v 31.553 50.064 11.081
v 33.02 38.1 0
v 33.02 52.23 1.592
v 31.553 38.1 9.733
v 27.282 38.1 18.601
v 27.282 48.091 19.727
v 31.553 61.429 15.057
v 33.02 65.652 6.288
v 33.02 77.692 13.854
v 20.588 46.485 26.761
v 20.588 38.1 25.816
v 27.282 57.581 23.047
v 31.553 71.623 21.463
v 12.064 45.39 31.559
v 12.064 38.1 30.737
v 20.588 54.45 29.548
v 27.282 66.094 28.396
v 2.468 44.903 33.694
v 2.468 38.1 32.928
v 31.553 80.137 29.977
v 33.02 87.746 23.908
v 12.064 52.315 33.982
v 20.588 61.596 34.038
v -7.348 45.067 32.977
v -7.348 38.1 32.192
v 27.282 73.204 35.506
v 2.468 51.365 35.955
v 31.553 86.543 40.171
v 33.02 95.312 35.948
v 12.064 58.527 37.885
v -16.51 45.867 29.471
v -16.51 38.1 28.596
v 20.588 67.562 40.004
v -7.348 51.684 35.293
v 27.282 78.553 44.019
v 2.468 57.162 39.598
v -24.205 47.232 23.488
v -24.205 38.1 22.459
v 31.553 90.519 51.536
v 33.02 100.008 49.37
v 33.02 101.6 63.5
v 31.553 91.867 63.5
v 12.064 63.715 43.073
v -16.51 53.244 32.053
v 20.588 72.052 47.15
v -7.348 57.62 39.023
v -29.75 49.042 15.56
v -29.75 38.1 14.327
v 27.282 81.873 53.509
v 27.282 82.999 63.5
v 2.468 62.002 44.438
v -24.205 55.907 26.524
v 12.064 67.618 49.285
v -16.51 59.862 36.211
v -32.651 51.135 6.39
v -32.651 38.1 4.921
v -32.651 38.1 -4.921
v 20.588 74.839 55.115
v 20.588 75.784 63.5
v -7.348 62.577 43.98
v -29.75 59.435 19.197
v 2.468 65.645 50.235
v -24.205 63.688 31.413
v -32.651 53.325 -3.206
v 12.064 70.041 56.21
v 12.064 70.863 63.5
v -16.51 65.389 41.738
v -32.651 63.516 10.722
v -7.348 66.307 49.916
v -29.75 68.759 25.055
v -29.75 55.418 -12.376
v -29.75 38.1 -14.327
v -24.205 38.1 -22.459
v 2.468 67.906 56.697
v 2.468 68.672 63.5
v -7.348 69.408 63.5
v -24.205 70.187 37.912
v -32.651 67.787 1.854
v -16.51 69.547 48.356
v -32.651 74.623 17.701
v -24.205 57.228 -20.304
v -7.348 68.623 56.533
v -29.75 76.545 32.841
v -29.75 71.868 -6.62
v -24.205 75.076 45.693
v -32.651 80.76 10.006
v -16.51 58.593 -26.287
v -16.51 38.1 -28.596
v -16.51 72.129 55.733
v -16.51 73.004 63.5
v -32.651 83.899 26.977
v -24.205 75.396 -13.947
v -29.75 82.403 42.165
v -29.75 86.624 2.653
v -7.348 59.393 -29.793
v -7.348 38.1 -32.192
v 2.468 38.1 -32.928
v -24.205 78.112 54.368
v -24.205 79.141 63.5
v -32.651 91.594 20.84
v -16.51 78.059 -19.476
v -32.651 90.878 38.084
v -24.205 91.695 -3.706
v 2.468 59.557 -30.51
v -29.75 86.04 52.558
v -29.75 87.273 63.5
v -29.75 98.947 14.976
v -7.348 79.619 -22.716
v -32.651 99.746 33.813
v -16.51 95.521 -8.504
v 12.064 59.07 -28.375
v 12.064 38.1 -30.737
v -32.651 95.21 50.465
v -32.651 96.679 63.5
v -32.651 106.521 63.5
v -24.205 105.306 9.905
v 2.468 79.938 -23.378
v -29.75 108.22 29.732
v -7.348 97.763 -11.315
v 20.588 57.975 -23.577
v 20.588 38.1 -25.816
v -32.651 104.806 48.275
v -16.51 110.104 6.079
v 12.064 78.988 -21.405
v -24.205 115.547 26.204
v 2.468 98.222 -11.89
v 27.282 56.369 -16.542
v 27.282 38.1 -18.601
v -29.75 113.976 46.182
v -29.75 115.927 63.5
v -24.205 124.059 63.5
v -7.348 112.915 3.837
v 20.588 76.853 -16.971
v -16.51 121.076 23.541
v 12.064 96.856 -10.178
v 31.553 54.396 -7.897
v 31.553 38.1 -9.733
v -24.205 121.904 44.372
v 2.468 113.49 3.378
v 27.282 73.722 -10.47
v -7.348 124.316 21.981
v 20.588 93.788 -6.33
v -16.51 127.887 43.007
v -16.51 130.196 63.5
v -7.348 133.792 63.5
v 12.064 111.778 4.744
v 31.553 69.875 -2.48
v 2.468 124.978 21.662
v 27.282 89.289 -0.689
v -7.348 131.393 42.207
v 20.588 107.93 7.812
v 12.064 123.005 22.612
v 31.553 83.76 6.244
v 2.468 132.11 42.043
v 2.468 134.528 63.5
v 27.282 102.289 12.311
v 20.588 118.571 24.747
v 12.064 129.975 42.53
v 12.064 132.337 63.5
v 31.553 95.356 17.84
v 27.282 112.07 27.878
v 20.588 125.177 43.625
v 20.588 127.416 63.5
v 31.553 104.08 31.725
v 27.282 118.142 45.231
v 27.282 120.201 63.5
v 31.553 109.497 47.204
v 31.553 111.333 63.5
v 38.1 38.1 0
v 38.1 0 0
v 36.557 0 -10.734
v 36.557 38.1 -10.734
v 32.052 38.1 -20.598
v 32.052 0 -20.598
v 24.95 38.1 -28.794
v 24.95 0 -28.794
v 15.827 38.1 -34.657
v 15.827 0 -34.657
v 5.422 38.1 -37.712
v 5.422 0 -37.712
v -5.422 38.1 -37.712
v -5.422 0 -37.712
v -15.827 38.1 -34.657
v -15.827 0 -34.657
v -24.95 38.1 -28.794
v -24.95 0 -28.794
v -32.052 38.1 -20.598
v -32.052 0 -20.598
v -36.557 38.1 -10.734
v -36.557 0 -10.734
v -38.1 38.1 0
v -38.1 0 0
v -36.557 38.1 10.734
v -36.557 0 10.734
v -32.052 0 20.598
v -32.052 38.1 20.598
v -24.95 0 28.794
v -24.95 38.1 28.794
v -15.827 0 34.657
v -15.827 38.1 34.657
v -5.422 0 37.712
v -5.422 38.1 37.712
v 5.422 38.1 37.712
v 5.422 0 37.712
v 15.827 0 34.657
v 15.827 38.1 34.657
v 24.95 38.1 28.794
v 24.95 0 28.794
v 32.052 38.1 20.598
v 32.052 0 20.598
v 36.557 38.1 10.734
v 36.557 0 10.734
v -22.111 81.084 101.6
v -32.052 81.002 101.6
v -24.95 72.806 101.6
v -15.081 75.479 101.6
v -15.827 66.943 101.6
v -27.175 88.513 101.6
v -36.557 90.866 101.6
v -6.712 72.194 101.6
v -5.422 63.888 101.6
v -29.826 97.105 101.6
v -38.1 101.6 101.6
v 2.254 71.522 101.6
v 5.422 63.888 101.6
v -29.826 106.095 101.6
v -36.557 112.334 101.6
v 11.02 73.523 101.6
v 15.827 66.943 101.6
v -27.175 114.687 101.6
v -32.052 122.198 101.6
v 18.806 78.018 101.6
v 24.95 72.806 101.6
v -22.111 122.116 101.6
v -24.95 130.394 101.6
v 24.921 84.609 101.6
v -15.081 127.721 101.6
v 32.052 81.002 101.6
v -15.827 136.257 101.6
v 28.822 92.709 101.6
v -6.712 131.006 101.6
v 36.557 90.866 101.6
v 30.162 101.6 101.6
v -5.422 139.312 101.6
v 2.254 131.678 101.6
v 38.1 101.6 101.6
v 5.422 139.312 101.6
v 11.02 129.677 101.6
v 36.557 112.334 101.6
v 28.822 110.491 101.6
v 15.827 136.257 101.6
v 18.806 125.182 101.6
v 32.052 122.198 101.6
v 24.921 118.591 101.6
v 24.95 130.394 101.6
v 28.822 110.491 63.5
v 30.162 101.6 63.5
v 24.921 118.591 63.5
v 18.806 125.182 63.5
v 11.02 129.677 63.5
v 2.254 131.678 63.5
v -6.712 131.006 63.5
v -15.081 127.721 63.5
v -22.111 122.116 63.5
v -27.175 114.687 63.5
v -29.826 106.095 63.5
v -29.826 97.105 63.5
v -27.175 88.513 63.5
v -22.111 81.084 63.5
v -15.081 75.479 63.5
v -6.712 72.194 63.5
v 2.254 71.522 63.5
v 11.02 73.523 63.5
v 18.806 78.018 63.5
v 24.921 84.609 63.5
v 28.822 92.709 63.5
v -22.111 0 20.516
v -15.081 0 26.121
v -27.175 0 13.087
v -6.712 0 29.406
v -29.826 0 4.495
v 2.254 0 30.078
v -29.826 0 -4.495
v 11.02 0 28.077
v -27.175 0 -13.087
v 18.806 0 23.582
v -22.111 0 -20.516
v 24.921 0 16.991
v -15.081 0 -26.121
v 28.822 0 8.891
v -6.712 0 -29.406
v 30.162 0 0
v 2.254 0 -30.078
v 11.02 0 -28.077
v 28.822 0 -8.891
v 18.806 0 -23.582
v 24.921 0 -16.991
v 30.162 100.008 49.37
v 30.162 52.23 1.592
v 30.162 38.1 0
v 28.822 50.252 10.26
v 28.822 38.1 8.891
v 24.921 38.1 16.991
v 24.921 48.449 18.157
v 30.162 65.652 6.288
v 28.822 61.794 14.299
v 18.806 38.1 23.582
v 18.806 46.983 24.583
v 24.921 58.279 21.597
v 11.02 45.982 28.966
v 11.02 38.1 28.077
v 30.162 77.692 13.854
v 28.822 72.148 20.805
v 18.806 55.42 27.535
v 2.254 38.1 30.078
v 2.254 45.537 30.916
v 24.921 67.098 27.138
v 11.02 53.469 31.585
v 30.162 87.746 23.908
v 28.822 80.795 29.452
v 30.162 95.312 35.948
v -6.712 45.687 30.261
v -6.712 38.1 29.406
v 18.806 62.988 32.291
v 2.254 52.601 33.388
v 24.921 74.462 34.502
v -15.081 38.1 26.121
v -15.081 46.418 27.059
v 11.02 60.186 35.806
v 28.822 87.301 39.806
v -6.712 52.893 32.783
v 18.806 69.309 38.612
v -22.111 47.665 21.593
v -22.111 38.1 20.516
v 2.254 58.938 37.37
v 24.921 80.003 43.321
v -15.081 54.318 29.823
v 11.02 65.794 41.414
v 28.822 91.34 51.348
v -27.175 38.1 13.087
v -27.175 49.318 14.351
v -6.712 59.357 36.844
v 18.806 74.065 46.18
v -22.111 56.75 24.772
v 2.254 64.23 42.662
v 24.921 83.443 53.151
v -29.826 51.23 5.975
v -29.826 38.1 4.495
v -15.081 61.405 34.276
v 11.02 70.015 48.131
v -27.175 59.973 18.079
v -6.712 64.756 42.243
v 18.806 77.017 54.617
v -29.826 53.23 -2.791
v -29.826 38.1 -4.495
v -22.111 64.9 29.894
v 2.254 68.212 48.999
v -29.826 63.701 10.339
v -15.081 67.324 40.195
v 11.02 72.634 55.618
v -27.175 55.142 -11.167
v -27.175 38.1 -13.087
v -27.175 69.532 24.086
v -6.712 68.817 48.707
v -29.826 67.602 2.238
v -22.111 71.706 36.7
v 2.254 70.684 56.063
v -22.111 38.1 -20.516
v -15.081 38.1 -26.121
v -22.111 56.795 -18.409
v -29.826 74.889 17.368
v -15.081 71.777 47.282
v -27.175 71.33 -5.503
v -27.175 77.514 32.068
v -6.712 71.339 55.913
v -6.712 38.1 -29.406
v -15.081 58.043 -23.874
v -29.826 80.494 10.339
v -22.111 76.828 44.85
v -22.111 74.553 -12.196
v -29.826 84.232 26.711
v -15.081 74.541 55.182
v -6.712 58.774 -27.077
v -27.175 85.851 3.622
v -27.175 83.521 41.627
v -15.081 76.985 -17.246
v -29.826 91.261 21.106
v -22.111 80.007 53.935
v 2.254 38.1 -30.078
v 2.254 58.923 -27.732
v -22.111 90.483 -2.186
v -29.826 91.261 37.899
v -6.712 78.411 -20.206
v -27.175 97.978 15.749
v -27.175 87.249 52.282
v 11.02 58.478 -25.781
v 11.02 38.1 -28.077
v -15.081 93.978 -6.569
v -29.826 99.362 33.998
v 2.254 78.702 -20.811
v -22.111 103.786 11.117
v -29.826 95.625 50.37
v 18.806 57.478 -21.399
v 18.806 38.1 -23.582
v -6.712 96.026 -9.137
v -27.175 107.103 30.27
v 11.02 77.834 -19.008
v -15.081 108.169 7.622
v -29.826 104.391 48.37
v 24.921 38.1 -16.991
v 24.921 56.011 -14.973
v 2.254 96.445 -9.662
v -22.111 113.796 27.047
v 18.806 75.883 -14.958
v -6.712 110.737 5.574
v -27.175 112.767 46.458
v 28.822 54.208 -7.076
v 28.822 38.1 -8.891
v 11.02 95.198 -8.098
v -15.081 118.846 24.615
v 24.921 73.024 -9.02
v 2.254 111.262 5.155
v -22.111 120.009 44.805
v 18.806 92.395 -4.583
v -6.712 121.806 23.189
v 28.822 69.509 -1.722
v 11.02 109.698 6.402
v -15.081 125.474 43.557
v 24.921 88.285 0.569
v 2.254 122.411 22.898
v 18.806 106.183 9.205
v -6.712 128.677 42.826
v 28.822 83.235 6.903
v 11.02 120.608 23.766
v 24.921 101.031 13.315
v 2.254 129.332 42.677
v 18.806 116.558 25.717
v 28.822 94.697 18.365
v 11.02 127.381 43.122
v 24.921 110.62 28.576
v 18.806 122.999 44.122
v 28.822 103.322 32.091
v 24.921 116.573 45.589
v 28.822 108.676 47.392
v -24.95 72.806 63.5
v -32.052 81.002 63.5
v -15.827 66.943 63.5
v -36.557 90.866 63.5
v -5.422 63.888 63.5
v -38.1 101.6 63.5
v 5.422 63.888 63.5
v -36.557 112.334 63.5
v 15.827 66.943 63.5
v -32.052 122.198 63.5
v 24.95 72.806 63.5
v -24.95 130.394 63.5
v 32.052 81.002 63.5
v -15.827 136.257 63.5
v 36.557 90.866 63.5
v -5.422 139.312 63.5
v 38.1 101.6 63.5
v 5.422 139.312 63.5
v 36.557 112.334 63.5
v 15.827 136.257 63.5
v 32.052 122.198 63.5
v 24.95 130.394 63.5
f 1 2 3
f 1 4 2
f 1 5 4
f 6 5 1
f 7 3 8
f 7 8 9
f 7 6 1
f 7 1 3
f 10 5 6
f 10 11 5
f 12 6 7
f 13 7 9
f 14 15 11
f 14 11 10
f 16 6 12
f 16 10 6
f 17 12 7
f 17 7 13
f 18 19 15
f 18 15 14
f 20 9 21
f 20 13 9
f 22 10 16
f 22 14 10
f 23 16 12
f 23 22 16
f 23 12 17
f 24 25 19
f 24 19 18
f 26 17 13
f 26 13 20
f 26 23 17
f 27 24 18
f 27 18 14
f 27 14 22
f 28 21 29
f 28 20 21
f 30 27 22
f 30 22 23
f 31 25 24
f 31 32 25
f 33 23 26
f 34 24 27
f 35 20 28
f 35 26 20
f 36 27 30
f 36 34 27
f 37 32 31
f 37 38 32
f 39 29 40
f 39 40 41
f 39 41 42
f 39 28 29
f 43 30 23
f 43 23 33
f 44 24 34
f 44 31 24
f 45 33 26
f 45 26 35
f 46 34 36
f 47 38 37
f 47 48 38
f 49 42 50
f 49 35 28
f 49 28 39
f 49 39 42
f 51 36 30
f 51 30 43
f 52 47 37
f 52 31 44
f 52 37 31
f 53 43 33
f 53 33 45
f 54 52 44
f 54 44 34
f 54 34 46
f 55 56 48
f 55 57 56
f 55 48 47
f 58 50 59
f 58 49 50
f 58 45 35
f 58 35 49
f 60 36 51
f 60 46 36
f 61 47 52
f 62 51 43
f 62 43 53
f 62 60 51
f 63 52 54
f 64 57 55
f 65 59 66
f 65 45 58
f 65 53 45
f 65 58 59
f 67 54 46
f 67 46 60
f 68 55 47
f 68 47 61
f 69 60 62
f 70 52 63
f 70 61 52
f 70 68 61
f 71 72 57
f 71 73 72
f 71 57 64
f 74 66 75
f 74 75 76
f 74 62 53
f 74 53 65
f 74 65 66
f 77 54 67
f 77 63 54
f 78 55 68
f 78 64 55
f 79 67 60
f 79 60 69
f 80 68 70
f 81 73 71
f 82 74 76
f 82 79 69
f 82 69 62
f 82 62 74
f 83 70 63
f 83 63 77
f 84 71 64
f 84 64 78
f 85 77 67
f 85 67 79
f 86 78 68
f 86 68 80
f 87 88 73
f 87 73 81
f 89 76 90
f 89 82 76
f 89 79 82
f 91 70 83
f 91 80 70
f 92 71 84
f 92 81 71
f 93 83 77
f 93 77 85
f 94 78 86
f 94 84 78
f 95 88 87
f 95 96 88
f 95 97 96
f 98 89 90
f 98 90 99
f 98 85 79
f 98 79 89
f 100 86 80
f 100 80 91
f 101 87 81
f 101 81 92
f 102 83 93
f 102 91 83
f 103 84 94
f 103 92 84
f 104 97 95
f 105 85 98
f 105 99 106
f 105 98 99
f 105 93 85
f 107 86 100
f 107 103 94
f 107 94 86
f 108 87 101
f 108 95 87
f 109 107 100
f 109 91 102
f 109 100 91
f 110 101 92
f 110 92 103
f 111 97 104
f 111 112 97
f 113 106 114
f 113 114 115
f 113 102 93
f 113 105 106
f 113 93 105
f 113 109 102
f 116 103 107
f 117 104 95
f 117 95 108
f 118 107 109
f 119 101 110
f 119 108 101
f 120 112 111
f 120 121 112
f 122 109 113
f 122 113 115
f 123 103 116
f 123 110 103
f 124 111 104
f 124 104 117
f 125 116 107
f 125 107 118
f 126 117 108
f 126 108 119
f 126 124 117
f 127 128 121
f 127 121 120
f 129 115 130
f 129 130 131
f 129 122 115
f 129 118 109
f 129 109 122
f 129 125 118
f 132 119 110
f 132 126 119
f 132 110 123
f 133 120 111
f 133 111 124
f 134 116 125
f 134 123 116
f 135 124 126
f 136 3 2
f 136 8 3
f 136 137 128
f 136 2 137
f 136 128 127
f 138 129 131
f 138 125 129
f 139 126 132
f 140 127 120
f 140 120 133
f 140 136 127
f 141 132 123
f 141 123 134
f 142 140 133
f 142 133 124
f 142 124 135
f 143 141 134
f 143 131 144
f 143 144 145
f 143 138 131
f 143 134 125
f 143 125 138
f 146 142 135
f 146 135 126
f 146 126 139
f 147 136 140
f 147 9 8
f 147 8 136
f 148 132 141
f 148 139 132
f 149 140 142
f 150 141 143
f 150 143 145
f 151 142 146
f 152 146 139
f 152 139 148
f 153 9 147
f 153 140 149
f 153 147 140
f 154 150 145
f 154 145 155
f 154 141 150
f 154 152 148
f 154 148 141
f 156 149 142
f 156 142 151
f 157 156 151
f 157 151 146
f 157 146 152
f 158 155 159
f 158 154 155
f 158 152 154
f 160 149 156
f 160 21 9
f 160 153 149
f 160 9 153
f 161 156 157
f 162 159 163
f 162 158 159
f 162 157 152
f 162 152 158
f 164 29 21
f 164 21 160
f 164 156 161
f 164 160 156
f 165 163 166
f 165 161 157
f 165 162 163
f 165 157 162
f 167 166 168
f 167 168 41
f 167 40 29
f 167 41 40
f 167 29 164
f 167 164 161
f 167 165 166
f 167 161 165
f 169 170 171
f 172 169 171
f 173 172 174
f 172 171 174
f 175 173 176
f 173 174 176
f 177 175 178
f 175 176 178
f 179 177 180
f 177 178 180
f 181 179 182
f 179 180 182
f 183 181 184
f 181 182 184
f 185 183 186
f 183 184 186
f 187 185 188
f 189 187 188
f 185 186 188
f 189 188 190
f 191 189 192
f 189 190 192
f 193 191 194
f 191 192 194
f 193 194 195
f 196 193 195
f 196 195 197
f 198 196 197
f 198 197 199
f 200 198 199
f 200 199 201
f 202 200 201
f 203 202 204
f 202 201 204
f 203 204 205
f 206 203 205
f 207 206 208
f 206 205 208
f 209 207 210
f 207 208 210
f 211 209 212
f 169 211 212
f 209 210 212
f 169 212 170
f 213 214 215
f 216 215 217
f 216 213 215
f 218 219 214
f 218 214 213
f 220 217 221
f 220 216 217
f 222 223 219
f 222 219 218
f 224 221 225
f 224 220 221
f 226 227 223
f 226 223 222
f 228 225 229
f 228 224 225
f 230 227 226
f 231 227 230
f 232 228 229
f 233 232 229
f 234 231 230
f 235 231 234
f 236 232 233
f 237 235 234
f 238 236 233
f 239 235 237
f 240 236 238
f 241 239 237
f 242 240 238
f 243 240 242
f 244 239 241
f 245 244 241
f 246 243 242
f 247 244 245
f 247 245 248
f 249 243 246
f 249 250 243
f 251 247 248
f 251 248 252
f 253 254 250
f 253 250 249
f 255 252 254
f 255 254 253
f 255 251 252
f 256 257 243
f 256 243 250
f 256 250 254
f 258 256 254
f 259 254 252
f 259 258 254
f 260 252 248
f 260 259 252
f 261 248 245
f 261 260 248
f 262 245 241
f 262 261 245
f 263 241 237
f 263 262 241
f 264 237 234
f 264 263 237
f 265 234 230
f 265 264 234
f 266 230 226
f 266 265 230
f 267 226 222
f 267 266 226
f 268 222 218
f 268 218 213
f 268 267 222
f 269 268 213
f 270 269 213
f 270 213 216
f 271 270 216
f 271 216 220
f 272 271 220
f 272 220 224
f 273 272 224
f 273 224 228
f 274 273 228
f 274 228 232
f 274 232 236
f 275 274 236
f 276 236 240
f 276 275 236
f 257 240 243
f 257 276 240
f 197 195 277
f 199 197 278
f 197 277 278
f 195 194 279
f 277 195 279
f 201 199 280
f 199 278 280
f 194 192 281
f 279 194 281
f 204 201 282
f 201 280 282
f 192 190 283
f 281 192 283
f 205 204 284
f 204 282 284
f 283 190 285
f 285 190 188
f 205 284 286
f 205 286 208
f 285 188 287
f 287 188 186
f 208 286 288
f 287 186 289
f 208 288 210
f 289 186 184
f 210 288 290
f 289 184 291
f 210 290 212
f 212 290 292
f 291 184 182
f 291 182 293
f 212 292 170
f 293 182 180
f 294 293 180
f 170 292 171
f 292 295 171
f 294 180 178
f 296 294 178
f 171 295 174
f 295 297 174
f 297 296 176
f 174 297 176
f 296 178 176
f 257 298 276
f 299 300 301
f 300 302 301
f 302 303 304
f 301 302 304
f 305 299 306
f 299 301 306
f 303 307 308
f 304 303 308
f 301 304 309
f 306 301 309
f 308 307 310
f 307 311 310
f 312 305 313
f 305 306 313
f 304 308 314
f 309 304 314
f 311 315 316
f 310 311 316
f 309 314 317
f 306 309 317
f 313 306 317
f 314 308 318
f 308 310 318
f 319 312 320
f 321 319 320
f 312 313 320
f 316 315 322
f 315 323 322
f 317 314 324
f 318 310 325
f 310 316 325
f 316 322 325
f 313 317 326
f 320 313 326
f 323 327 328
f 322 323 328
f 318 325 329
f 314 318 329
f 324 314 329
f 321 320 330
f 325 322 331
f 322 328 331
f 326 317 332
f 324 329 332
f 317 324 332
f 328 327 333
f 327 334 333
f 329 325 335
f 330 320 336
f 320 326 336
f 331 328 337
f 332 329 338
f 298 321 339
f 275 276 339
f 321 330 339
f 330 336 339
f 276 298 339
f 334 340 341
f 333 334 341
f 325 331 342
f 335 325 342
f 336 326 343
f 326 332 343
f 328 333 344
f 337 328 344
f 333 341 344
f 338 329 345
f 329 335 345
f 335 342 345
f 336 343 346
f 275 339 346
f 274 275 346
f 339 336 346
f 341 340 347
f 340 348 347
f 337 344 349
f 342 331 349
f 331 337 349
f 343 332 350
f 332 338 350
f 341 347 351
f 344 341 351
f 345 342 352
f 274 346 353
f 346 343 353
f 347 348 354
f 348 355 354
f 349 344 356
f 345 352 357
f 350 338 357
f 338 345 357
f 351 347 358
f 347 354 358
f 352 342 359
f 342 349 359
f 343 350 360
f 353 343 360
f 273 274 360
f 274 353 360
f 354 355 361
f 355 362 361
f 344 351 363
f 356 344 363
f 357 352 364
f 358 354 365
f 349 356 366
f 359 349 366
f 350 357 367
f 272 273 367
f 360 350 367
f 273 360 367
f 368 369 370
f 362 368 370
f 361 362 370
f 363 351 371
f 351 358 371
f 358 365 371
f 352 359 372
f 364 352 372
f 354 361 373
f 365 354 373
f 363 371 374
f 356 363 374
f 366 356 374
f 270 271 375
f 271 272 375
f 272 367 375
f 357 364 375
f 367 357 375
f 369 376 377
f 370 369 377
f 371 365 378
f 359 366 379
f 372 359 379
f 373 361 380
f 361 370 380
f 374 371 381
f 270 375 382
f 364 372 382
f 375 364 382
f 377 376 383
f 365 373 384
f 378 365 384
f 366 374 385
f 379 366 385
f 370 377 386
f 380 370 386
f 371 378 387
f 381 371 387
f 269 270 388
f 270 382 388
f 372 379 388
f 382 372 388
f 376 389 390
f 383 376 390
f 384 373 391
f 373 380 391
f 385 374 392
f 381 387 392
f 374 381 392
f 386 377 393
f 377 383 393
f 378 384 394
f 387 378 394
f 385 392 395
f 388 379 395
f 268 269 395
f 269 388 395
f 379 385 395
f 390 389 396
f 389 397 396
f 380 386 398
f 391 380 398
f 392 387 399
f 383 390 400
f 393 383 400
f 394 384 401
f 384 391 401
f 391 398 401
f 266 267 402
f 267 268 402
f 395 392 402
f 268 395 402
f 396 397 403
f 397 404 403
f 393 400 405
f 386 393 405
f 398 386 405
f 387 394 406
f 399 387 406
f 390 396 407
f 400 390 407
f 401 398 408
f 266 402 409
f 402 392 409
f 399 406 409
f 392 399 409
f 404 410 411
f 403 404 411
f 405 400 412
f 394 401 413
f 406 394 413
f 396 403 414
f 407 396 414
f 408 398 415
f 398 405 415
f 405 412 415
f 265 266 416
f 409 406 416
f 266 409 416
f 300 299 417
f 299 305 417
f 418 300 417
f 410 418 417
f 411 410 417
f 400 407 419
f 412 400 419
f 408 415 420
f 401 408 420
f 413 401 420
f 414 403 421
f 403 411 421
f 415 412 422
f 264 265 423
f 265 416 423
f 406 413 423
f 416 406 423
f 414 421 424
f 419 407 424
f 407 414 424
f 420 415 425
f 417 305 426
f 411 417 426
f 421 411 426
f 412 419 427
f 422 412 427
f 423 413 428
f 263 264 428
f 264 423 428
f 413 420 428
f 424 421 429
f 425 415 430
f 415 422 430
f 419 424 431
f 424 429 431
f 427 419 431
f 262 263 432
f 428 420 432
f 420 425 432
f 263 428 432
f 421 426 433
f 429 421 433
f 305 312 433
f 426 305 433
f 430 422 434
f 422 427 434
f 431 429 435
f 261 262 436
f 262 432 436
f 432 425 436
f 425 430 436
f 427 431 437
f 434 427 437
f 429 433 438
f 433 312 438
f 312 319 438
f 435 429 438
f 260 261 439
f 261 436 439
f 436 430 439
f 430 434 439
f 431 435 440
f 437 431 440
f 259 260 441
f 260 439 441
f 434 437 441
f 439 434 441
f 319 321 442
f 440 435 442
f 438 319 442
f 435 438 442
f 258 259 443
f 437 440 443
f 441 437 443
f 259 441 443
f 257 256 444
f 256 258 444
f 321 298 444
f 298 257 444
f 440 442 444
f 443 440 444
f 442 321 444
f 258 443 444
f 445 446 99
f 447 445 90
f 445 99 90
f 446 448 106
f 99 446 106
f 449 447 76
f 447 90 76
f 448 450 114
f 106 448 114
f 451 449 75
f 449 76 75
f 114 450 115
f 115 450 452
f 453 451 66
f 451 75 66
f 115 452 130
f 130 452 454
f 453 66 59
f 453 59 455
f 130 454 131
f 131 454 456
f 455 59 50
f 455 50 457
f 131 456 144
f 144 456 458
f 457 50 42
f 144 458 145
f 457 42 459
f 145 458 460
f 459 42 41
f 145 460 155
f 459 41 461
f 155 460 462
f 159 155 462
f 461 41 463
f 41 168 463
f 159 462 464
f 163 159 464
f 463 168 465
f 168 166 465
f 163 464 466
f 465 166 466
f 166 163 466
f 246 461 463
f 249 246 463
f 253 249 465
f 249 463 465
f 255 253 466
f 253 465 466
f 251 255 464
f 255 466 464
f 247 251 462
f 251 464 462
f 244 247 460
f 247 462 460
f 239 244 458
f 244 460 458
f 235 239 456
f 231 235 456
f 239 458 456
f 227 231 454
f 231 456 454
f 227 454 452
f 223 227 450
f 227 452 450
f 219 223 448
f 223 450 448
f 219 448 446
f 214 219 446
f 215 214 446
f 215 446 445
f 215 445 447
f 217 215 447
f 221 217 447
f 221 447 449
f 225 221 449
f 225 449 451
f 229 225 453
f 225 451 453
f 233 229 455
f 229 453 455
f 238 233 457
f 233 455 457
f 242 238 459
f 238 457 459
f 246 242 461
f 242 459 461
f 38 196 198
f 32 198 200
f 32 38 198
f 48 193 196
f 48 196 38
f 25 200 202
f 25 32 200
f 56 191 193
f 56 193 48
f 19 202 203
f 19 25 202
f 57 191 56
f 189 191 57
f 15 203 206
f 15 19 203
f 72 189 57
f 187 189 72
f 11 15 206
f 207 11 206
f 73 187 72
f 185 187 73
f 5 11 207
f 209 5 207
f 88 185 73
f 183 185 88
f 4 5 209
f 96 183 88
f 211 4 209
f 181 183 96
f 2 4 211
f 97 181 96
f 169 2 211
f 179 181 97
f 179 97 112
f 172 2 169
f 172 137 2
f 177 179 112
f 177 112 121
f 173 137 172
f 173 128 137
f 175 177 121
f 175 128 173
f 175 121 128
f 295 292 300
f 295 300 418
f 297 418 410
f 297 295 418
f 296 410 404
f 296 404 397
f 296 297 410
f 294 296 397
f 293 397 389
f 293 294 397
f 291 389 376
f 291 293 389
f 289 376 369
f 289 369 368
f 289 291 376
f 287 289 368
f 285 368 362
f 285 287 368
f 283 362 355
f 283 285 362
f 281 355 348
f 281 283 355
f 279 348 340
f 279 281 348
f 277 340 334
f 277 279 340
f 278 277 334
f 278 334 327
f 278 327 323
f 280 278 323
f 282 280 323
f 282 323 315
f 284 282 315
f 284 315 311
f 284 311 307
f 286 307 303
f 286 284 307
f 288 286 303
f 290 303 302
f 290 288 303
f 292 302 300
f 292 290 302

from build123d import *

# Parameters (mm, degrees)
SKETCH1_R           = 38.1
SKETCH1_R_2         = 30.1625
BOSS_EXTRUDE1_DEPTH = 38.1
SKETCH4_R           = 38.1
SKETCH4_R_2         = 30.1625
BOSS_EXTRUDE2_DEPTH = 38.1
SKETCH6_R           = 33.02
SKETCH6_R_2         = 30.1625


with BuildPart() as part:
    # Sketch1 → Boss-Extrude1 (new body)
    with BuildSketch(Plane(origin=(0, 0, 0), x_dir=(1, 0, 0), z_dir=(0, 1, 0))):
        Circle(SKETCH1_R)
        Circle(SKETCH1_R_2, mode=Mode.SUBTRACT)
    extrude(amount=BOSS_EXTRUDE1_DEPTH)



with BuildPart() as body_2:
    # Sketch4 → Boss-Extrude2 (new body)
    with BuildSketch(Plane.XY.offset(63.5)):
        with Locations((0, 101.6)):
            Circle(SKETCH4_R)
        with Locations((0, 101.6)):
            Circle(SKETCH4_R_2, mode=Mode.SUBTRACT)
    extrude(amount=BOSS_EXTRUDE2_DEPTH)


with BuildPart() as part_1:
    add(part.part)

    add(body_2.part)  # Sweep2 merges body 2
    # Sweep2: sweep along a path in Sketch3
    with BuildLine(Plane(origin=(0, 0, 0), x_dir=(0, 0, -1), z_dir=(1, 0, 0))) as sweep2_path:
        ThreePointArc((0, 38.1), (-18.598719395, 83.001280605), (-63.5, 101.6))
    # Sketch6 → Sweep2 (sweep)
    with BuildSketch(Plane(origin=(0, 38.1, 0), x_dir=(1, 0, 0), z_dir=(0, 1, 0))):
        Circle(SKETCH6_R)
        Circle(SKETCH6_R_2, mode=Mode.SUBTRACT)
    sweep(path=sweep2_path.line)


solid = part_1.part
